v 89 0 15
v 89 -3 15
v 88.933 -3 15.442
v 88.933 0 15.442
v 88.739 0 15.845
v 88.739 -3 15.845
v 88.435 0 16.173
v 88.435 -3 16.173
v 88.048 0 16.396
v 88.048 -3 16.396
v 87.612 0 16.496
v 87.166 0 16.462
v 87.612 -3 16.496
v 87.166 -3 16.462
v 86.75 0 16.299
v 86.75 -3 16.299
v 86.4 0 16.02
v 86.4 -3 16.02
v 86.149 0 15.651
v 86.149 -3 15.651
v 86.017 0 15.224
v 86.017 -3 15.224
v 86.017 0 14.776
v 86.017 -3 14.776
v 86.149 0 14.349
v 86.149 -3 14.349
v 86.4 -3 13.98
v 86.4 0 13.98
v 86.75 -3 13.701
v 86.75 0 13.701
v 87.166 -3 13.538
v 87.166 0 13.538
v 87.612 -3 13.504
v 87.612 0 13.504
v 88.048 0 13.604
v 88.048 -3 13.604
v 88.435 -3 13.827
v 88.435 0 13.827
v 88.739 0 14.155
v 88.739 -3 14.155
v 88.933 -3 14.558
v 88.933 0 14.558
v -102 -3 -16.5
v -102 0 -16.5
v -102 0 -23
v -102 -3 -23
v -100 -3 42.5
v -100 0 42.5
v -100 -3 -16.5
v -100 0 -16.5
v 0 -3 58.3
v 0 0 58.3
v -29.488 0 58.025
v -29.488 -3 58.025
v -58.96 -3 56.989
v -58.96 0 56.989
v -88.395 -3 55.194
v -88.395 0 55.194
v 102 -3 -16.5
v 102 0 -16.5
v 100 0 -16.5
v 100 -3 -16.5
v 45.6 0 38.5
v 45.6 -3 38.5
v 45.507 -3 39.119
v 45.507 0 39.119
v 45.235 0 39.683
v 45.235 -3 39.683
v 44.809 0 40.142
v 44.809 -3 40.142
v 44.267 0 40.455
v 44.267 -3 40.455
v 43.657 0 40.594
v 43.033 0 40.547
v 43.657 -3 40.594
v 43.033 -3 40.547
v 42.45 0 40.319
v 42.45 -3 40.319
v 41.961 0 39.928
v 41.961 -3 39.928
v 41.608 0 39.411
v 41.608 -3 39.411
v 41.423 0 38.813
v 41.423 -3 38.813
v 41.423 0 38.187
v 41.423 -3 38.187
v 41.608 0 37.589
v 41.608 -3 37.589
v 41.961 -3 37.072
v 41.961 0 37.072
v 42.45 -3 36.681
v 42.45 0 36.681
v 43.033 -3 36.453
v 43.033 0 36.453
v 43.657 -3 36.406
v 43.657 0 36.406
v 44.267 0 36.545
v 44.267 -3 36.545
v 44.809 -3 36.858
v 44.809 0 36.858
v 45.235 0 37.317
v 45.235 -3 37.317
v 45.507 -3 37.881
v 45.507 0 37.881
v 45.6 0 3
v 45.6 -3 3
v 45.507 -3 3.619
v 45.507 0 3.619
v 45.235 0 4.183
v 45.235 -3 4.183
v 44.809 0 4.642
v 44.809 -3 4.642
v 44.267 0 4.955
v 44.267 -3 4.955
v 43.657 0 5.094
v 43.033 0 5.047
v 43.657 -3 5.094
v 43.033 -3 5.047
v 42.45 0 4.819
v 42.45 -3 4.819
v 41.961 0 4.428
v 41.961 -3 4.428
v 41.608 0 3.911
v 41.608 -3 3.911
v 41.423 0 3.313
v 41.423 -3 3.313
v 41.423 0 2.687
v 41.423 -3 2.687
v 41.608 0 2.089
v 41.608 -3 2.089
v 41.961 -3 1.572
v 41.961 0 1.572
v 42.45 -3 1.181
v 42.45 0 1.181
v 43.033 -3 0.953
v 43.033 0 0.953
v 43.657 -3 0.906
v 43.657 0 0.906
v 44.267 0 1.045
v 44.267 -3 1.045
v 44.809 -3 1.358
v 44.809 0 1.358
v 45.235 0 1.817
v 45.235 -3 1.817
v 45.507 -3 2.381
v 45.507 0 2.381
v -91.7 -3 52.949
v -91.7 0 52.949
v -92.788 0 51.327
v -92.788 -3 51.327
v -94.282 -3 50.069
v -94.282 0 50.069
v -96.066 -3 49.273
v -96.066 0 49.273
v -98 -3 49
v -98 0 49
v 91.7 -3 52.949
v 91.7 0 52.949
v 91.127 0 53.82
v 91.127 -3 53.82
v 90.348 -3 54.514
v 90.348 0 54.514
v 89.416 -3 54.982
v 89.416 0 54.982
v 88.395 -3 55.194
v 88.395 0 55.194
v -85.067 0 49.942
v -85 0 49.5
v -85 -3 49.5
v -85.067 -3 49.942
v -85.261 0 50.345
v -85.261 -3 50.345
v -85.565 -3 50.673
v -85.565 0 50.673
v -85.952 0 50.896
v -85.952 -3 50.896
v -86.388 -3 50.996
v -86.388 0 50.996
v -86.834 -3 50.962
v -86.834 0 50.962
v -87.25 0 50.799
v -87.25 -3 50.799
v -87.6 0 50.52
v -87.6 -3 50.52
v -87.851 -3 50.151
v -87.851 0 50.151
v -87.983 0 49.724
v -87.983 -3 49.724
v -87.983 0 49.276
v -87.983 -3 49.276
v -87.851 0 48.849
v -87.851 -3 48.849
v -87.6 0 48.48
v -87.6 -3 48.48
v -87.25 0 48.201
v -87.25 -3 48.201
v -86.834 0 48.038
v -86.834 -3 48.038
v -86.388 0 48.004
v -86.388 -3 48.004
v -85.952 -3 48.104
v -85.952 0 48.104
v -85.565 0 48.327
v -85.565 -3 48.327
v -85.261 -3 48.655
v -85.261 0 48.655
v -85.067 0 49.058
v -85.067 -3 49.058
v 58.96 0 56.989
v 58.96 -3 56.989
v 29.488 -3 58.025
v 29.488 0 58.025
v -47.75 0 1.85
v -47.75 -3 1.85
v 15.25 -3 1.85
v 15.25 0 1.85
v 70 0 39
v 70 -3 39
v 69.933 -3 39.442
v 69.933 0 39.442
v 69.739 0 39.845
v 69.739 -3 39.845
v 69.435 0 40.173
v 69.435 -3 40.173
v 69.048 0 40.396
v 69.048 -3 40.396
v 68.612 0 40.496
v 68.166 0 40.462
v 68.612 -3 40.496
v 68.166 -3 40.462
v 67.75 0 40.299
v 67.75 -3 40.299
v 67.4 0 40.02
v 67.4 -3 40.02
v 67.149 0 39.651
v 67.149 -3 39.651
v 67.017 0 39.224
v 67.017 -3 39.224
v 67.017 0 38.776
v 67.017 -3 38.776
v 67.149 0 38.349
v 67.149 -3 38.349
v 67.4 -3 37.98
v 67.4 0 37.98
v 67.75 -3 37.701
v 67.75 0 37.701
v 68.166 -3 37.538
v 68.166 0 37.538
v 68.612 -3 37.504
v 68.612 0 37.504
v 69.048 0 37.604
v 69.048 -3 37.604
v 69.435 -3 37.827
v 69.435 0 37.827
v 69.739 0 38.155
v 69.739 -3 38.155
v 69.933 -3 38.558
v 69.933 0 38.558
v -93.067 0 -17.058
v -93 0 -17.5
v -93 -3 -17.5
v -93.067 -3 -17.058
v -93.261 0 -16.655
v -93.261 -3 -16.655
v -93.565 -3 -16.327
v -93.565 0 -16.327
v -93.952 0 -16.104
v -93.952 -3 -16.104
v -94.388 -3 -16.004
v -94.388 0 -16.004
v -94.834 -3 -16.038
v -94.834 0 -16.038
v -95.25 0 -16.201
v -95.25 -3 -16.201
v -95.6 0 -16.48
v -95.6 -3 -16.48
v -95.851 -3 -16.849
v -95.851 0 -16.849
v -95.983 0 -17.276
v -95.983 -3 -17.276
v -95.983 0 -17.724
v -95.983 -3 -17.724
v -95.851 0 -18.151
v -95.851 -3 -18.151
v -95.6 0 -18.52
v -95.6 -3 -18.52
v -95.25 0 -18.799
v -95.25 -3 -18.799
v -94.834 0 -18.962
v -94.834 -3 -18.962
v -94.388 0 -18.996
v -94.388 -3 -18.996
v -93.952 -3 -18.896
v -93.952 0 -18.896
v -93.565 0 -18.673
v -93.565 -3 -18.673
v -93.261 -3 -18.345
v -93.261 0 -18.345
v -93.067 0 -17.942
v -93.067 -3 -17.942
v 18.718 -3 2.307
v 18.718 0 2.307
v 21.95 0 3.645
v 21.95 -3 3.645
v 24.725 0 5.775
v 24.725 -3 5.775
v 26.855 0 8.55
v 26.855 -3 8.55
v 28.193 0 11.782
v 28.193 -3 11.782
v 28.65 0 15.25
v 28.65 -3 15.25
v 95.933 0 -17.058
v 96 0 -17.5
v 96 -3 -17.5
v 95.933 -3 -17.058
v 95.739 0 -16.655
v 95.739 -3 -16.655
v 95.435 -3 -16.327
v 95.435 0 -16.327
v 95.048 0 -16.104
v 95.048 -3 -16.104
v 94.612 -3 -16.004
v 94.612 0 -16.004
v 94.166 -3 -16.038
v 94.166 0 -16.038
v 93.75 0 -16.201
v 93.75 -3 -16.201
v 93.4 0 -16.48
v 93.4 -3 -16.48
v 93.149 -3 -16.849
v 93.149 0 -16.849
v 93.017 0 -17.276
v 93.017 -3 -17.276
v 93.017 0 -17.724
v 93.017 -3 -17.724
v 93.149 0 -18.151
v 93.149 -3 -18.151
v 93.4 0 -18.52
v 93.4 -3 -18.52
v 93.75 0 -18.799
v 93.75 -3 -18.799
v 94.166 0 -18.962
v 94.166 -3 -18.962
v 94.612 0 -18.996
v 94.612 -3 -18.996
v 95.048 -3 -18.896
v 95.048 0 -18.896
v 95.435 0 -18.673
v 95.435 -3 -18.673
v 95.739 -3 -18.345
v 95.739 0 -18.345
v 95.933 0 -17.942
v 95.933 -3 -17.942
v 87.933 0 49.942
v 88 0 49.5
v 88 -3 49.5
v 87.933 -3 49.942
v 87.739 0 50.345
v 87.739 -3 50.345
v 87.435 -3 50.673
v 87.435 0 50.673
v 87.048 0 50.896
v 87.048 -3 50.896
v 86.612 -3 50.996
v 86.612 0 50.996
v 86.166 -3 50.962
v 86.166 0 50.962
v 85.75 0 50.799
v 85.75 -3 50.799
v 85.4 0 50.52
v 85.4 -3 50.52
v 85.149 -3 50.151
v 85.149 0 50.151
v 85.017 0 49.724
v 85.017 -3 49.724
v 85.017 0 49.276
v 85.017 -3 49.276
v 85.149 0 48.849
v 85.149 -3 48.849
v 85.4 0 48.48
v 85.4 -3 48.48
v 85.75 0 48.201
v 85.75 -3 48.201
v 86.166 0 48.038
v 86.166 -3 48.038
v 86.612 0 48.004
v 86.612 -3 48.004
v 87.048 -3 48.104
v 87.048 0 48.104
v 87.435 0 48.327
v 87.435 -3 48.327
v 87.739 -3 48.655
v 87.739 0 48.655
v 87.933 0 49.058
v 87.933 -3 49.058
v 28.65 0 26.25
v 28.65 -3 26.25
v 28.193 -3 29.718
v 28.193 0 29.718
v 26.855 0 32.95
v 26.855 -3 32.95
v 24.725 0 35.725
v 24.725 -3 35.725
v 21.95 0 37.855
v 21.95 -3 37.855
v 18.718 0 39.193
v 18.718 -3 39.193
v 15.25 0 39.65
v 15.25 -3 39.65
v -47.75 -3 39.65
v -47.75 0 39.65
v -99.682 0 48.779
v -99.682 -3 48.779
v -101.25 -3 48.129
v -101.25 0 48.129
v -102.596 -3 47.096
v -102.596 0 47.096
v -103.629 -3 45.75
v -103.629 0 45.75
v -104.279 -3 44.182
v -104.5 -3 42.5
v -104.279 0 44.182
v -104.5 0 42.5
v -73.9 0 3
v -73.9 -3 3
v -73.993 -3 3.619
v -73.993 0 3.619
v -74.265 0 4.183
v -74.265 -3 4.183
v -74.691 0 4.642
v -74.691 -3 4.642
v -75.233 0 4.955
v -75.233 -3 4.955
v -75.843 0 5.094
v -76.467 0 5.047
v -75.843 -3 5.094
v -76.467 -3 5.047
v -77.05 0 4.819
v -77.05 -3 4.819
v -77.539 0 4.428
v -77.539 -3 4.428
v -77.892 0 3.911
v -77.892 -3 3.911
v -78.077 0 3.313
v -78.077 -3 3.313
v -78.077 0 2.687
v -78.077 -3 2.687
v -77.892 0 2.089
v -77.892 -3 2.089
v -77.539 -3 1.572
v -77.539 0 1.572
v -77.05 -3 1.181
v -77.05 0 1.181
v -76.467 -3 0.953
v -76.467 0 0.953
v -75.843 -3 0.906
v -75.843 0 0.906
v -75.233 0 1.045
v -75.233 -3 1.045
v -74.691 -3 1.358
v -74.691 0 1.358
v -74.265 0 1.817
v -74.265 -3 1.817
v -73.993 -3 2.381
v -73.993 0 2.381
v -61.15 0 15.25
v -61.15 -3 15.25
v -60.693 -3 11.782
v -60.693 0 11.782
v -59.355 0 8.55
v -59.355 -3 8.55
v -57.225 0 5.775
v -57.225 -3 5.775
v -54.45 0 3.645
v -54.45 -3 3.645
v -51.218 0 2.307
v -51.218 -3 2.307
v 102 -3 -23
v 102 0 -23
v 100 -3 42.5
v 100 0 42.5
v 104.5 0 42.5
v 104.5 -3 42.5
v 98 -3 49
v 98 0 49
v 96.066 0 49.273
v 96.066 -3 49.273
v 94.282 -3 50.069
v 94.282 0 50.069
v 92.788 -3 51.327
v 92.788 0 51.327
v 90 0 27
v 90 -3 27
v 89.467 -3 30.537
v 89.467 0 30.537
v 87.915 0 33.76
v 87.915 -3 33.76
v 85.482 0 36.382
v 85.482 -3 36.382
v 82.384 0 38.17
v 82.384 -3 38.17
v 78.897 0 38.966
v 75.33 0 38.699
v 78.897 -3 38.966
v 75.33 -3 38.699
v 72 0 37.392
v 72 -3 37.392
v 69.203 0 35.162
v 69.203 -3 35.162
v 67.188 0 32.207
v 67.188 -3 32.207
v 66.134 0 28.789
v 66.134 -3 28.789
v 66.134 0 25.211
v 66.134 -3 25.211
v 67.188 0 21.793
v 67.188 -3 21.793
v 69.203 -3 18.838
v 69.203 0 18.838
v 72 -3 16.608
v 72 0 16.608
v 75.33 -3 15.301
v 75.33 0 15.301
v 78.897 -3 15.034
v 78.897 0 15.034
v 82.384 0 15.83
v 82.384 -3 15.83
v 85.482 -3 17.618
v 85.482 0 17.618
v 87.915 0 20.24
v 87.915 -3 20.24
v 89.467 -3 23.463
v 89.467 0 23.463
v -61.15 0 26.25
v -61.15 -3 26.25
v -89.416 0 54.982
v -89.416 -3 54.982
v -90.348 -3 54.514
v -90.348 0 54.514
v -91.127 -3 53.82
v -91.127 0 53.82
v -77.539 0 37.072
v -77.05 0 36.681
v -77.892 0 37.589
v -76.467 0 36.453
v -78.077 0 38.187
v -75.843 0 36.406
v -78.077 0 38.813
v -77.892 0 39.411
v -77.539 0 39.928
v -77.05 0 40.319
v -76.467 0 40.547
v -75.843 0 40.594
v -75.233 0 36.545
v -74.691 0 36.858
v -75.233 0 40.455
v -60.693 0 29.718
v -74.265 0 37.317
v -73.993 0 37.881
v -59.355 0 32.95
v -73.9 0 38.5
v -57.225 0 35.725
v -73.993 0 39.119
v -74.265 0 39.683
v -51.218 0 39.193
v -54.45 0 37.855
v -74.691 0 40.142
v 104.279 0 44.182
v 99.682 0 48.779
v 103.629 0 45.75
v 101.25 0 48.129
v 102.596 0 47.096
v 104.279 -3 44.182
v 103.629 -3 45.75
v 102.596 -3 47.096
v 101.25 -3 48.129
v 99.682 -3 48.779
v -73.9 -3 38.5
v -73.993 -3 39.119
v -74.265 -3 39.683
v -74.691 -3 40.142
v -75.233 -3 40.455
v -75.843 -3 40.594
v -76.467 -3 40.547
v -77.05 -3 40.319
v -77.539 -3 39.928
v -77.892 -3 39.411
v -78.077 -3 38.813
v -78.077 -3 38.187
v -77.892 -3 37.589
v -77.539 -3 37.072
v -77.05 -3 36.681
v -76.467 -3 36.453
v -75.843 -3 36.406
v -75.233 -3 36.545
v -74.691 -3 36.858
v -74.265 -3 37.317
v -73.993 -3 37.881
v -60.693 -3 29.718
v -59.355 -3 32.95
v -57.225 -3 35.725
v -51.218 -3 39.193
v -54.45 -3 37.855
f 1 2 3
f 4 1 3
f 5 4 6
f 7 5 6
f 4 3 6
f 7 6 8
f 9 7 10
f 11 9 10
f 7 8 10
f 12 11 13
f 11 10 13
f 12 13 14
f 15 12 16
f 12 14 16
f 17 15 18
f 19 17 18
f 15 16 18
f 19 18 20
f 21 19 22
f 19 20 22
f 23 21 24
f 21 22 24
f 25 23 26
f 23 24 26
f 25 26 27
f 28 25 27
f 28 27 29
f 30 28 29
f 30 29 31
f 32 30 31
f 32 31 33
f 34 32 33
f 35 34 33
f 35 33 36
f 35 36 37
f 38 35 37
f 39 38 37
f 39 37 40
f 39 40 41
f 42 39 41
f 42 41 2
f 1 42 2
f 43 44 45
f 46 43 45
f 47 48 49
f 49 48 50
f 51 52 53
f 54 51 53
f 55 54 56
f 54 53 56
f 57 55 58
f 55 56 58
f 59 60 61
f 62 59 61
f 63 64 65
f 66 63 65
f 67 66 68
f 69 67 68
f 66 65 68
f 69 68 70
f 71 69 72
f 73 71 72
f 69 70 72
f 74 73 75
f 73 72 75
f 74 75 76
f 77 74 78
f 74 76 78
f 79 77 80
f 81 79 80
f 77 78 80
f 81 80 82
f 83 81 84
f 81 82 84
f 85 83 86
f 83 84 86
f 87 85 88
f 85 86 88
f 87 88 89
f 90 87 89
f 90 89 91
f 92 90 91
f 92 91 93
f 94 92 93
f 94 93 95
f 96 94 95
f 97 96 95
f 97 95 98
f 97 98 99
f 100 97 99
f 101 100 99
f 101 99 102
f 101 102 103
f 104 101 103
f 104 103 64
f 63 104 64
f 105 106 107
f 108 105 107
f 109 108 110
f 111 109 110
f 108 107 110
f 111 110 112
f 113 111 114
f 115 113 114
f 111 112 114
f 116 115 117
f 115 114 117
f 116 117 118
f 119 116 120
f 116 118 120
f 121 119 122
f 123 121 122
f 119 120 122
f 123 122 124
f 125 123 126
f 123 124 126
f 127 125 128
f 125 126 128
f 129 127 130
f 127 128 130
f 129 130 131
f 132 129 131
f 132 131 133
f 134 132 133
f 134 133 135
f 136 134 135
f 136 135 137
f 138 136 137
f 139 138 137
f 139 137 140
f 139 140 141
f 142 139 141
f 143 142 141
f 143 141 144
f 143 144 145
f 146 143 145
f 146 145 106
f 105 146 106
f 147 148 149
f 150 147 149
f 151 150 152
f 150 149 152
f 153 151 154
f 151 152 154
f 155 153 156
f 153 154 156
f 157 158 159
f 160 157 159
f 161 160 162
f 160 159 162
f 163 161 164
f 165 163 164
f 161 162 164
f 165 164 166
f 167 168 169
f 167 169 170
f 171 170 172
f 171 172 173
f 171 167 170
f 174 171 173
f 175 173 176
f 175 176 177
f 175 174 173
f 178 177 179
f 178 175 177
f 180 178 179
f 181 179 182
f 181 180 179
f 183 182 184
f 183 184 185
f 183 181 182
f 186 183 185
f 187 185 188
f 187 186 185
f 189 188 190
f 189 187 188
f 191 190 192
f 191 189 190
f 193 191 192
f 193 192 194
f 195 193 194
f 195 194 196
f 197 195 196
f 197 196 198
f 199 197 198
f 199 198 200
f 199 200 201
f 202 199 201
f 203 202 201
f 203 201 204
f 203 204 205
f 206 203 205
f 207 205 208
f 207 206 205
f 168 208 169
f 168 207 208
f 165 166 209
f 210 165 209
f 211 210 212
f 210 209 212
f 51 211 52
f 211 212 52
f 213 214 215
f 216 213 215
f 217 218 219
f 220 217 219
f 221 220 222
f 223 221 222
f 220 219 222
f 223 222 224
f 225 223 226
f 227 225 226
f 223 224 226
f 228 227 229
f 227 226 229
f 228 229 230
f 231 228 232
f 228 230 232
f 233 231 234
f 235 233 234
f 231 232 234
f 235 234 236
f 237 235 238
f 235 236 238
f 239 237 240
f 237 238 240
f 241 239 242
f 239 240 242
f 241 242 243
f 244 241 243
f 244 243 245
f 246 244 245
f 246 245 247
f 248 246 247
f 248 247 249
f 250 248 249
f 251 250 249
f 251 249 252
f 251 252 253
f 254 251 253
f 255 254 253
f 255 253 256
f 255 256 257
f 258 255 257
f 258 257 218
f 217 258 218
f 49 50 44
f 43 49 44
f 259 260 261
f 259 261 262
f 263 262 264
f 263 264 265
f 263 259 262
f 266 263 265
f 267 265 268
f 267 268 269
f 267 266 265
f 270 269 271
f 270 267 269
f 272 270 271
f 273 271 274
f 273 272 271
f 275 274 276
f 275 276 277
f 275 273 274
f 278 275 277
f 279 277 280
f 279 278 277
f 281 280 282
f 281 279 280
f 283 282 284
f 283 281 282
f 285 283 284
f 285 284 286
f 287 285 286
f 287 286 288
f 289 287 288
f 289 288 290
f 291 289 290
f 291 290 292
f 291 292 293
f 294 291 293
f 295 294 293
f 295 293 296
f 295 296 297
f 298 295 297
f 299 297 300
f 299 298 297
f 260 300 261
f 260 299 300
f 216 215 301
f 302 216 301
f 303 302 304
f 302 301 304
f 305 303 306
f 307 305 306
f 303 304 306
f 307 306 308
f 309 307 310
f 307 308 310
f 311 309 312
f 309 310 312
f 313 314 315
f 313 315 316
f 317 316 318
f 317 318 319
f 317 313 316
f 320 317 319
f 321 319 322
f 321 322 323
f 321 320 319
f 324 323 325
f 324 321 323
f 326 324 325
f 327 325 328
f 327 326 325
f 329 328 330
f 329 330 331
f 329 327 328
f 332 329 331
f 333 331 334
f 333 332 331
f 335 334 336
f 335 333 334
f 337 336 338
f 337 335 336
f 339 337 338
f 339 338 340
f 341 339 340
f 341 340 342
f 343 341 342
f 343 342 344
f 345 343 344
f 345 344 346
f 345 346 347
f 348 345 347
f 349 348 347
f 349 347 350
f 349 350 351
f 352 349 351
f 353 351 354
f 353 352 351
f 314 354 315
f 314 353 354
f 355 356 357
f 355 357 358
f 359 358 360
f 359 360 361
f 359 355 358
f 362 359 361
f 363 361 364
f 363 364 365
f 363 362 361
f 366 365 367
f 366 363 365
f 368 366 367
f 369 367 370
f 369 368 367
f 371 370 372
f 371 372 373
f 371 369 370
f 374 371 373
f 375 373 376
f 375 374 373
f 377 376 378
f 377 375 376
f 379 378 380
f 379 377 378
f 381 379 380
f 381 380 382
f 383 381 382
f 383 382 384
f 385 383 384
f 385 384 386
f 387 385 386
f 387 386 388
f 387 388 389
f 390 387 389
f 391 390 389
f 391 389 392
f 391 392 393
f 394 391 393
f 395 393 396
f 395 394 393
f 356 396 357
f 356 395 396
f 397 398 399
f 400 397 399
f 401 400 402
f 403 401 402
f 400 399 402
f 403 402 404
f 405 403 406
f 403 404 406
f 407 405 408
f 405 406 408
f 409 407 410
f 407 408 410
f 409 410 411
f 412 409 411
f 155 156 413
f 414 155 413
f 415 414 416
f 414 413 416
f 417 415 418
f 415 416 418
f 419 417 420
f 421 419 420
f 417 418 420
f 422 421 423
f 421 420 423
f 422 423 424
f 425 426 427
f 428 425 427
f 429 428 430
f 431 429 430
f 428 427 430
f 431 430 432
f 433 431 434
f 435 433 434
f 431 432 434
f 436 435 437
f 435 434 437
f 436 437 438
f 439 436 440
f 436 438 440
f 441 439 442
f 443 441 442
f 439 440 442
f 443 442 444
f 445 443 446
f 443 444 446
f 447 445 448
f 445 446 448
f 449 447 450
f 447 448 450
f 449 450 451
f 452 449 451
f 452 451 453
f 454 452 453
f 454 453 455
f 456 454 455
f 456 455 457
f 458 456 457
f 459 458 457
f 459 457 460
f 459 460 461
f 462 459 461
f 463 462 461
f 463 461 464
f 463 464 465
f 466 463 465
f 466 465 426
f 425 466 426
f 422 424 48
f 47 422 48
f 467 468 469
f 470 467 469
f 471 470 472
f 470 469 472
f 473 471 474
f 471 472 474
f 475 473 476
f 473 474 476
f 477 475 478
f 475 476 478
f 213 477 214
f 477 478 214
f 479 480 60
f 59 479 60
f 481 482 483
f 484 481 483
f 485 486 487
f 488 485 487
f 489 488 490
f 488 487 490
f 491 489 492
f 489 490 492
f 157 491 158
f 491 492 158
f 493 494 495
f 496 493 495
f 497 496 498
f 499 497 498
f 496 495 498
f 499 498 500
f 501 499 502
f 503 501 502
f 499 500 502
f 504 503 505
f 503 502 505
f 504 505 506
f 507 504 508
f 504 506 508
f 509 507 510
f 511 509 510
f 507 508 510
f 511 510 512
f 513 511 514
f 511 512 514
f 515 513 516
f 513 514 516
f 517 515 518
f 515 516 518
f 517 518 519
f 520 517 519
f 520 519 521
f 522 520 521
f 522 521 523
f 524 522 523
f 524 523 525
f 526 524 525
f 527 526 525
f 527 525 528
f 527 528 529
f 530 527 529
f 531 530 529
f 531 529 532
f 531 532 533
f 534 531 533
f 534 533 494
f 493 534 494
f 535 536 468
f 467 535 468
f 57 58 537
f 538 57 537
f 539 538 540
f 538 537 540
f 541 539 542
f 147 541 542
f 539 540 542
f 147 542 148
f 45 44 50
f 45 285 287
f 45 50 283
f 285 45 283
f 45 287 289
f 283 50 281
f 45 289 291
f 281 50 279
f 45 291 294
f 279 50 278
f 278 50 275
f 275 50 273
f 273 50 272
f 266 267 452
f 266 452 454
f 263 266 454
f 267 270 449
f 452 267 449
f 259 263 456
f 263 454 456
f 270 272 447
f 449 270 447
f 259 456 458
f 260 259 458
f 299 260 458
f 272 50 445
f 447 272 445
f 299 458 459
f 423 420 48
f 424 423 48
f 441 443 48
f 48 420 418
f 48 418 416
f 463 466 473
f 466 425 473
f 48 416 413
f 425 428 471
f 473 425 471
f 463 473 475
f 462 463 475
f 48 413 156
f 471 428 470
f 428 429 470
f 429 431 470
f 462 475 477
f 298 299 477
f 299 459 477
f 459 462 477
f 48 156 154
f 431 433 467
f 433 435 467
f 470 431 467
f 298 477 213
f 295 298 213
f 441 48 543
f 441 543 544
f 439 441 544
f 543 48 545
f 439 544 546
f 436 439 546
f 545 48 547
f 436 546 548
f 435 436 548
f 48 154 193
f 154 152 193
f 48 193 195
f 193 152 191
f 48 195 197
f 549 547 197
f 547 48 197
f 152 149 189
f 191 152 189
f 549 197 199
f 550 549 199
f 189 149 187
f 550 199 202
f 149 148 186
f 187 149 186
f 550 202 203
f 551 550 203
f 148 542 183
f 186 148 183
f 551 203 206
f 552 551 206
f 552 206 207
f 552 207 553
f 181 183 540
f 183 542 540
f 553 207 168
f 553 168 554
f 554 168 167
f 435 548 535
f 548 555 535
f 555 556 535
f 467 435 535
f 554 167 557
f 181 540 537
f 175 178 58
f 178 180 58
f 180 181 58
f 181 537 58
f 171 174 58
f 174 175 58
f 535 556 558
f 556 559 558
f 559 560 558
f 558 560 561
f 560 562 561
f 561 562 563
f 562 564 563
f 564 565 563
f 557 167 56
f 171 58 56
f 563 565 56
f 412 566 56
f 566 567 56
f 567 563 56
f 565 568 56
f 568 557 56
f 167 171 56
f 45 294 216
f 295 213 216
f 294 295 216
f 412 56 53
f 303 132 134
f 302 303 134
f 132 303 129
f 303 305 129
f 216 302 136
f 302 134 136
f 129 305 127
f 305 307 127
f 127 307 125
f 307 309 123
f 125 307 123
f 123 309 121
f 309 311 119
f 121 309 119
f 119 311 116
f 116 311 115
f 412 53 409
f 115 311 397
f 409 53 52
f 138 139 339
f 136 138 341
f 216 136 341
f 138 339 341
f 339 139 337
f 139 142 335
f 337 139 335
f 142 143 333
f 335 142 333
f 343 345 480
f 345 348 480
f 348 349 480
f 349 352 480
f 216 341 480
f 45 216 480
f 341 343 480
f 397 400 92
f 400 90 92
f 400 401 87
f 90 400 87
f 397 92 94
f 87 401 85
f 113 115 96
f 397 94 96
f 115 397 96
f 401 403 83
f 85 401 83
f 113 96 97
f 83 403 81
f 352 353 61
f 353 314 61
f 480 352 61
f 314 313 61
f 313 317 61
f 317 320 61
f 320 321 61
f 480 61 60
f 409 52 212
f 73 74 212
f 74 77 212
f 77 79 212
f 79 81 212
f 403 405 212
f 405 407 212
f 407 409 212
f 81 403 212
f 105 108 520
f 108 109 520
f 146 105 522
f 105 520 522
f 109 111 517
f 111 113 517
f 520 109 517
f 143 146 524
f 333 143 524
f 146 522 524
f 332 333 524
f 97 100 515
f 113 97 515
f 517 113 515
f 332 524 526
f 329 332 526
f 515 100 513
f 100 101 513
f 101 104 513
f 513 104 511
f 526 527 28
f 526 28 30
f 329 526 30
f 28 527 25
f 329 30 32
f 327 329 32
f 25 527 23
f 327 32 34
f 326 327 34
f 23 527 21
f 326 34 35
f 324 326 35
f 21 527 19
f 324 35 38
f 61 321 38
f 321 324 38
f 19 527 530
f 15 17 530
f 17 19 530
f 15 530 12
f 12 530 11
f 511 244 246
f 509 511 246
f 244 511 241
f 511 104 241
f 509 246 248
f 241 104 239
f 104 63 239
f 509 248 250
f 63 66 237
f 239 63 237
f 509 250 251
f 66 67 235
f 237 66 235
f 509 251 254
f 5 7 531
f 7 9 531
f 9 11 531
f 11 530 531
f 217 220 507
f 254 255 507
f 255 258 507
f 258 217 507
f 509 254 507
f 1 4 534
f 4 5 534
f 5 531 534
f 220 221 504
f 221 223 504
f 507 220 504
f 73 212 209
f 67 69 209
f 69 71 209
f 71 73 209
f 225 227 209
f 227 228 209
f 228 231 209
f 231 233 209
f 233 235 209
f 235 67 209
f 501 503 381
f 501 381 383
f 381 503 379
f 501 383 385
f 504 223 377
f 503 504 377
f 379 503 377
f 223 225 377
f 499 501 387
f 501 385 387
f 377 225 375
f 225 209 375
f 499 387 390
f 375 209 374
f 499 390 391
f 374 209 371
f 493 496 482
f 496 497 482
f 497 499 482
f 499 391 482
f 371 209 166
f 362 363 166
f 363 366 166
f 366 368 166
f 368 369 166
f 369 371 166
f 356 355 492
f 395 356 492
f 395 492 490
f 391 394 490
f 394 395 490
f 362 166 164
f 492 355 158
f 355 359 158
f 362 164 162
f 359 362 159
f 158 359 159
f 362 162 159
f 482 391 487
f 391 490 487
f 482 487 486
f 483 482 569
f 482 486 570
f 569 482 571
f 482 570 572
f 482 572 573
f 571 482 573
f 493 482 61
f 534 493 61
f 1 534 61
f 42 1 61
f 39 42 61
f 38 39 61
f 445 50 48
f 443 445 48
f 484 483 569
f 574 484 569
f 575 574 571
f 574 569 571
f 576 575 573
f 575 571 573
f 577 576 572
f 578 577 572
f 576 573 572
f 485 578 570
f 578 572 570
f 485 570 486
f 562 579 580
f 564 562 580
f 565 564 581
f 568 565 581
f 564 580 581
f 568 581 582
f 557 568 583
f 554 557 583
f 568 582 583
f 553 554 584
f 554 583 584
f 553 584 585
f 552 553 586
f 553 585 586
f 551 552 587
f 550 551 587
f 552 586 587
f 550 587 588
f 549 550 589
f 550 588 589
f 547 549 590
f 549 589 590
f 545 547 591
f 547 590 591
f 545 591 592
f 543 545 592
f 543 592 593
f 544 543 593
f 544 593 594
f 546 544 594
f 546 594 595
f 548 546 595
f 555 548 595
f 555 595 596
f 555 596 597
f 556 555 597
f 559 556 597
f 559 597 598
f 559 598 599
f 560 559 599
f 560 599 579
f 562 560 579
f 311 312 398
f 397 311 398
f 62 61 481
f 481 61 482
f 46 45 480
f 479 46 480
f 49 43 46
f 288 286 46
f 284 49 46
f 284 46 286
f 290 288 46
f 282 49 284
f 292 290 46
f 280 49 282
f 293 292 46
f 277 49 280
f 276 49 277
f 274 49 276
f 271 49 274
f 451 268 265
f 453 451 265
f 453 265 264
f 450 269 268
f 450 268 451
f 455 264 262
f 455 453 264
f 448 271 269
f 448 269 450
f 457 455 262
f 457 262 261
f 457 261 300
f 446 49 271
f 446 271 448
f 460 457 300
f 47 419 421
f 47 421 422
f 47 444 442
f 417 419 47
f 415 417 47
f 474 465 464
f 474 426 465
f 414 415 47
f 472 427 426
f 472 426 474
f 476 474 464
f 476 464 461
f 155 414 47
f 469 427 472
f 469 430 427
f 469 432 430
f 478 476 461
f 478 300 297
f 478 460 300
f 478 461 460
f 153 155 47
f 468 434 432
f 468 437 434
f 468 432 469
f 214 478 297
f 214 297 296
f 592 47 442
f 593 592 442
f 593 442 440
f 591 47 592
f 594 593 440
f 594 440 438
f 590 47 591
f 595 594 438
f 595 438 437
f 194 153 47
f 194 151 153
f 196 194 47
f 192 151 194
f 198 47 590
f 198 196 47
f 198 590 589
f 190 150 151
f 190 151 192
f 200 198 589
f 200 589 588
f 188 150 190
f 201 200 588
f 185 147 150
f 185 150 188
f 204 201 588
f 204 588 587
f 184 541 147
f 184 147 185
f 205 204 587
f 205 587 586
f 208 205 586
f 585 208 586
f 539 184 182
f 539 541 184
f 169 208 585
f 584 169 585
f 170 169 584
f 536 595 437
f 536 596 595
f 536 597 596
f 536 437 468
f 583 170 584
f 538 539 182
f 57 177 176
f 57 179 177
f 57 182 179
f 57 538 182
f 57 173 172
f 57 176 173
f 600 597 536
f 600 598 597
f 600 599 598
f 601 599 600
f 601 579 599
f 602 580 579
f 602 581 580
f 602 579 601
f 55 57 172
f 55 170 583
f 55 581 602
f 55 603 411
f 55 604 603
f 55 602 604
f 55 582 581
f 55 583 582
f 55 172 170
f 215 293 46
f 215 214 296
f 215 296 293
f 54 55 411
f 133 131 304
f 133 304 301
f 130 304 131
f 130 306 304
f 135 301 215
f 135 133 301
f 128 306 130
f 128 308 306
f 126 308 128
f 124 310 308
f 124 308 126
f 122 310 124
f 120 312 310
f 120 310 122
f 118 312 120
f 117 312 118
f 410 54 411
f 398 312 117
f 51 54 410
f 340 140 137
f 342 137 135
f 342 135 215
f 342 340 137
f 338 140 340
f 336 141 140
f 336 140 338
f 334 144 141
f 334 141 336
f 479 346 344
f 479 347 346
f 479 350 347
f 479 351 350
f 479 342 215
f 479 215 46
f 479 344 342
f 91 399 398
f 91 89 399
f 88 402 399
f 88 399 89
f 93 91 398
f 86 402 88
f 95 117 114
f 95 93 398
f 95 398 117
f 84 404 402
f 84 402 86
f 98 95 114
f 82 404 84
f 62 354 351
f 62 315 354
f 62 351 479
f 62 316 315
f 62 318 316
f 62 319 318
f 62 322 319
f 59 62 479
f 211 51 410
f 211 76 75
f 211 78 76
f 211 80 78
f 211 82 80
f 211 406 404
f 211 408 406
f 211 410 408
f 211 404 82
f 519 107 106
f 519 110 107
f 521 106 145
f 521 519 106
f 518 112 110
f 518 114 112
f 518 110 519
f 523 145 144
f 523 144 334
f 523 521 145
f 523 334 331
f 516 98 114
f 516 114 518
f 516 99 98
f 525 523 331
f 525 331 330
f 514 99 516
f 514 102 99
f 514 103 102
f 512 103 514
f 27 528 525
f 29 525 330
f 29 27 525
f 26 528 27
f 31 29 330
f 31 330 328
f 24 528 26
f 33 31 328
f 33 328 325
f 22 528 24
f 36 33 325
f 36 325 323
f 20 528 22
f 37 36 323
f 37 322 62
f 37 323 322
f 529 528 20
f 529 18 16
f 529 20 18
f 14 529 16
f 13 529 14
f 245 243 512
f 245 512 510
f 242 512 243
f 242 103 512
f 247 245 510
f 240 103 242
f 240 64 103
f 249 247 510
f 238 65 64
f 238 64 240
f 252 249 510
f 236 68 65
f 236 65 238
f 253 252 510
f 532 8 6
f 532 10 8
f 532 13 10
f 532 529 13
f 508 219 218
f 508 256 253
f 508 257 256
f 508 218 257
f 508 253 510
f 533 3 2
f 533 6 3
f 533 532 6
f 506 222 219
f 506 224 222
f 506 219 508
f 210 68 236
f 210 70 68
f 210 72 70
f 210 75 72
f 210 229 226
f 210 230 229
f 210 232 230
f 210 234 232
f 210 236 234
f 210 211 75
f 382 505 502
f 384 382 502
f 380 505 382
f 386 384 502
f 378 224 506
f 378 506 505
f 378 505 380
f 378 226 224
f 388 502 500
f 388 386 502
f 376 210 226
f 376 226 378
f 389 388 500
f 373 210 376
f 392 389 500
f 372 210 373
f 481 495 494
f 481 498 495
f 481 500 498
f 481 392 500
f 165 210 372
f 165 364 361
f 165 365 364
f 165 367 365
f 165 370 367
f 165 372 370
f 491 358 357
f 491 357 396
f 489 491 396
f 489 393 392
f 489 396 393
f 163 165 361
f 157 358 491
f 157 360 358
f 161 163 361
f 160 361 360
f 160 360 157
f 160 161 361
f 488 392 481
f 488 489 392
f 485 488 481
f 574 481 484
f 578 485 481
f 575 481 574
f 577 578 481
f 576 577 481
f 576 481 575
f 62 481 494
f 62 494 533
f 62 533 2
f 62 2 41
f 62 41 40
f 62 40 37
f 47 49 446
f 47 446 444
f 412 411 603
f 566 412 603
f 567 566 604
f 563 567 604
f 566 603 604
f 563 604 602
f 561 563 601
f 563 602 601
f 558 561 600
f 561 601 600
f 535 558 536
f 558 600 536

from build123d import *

# Parameters (mm, degrees)
F0_R     = 1.5
F1_DEPTH = 3
F2_R     = 12
F2_R_2   = 1.5
F3_DEPTH = 25
F4_R     = 2.1
F5_DEPTH = 25


with BuildPart() as f1:
    # F0 (on Front) → F1 (new body)
    with BuildSketch(Plane.XZ):
        with BuildLine():
            Line((-102, -16.5), (-102, -23))
            Line((-102, -23), (0, -23))
            Line((0, -23), (102, -23))
            Line((102, -23), (102, -16.5))
            Line((102, -16.5), (100, -16.5))
            Line((100, -16.5), (100, 42.5))
            Line((100, 42.5), (104.5, 42.5))
            ThreePointArc((104.5, 42.5), (102.596194, 47.096194), (98, 49))
            ThreePointArc((98, 49), (94.28238, 50.068786), (91.7, 52.948771))
            ThreePointArc((91.7, 52.948771), (90.347923, 54.513813), (88.394881, 55.194327))
            ThreePointArc((88.394881, 55.194327), (44.227467, 57.601774), (0, 58.3))
            ThreePointArc((0, 58.3), (-44.227467, 57.601774), (-88.394881, 55.194327))
            ThreePointArc((-88.394881, 55.194327), (-90.347923, 54.513813), (-91.7, 52.948771))
            ThreePointArc((-91.7, 52.948771), (-94.28238, 50.068786), (-98, 49))
            ThreePointArc((-98, 49), (-102.596194, 47.096194), (-104.5, 42.5))
            Line((-104.5, 42.5), (-102, 42.5))
            Line((-102, 42.5), (-100, 42.5))
            Line((-100, 42.5), (-100, -16.5))
            Line((-100, -16.5), (-102, -16.5))
        make_face()
        with Locations((-94.5, -17.5)):
            Circle(F0_R, mode=Mode.SUBTRACT)
        with Locations((94.5, -17.5)):
            Circle(F0_R, mode=Mode.SUBTRACT)
        with Locations((-86.5, 49.5)):
            Circle(F0_R, mode=Mode.SUBTRACT)
        with Locations((86.5, 49.5)):
            Circle(F0_R, mode=Mode.SUBTRACT)
    extrude(amount=F1_DEPTH)

    # F2 (on face) → F3 (cut)
    with BuildSketch(Plane.XZ.offset(3)):
        with Locations((78, 27)):
            Circle(F2_R)
        with Locations((87.5, 15)):
            Circle(F2_R_2)
        with Locations((68.5, 39)):
            Circle(F2_R_2)
    extrude(amount=-F3_DEPTH, mode=Mode.SUBTRACT)

    # F4 (on face) → F5 (cut)
    with BuildSketch(Plane.XZ.offset(3)):
        with BuildLine():
            Line((15.25, 39.65), (-47.75, 39.65))
            ThreePointArc((-47.75, 39.65), (-57.225231, 35.725231), (-61.15, 26.25))
            Line((-61.15, 26.25), (-61.15, 15.25))
            ThreePointArc((-61.15, 15.25), (-57.225231, 5.774769), (-47.75, 1.85))
            Line((-47.75, 1.85), (15.25, 1.85))
            ThreePointArc((15.25, 1.85), (24.725231, 5.774769), (28.65, 15.25))
            Line((28.65, 15.25), (28.65, 26.25))
            ThreePointArc((28.65, 26.25), (24.725231, 35.725231), (15.25, 39.65))
        make_face()
        with Locations((-76, 38.5)):
            Circle(F4_R)
        with Locations((-76, 3)):
            Circle(F4_R)
        with Locations((43.5, 3)):
            Circle(F4_R)
        with Locations((43.5, 38.5)):
            Circle(F4_R)
    extrude(amount=-F5_DEPTH, mode=Mode.SUBTRACT)


solid = f1.part
